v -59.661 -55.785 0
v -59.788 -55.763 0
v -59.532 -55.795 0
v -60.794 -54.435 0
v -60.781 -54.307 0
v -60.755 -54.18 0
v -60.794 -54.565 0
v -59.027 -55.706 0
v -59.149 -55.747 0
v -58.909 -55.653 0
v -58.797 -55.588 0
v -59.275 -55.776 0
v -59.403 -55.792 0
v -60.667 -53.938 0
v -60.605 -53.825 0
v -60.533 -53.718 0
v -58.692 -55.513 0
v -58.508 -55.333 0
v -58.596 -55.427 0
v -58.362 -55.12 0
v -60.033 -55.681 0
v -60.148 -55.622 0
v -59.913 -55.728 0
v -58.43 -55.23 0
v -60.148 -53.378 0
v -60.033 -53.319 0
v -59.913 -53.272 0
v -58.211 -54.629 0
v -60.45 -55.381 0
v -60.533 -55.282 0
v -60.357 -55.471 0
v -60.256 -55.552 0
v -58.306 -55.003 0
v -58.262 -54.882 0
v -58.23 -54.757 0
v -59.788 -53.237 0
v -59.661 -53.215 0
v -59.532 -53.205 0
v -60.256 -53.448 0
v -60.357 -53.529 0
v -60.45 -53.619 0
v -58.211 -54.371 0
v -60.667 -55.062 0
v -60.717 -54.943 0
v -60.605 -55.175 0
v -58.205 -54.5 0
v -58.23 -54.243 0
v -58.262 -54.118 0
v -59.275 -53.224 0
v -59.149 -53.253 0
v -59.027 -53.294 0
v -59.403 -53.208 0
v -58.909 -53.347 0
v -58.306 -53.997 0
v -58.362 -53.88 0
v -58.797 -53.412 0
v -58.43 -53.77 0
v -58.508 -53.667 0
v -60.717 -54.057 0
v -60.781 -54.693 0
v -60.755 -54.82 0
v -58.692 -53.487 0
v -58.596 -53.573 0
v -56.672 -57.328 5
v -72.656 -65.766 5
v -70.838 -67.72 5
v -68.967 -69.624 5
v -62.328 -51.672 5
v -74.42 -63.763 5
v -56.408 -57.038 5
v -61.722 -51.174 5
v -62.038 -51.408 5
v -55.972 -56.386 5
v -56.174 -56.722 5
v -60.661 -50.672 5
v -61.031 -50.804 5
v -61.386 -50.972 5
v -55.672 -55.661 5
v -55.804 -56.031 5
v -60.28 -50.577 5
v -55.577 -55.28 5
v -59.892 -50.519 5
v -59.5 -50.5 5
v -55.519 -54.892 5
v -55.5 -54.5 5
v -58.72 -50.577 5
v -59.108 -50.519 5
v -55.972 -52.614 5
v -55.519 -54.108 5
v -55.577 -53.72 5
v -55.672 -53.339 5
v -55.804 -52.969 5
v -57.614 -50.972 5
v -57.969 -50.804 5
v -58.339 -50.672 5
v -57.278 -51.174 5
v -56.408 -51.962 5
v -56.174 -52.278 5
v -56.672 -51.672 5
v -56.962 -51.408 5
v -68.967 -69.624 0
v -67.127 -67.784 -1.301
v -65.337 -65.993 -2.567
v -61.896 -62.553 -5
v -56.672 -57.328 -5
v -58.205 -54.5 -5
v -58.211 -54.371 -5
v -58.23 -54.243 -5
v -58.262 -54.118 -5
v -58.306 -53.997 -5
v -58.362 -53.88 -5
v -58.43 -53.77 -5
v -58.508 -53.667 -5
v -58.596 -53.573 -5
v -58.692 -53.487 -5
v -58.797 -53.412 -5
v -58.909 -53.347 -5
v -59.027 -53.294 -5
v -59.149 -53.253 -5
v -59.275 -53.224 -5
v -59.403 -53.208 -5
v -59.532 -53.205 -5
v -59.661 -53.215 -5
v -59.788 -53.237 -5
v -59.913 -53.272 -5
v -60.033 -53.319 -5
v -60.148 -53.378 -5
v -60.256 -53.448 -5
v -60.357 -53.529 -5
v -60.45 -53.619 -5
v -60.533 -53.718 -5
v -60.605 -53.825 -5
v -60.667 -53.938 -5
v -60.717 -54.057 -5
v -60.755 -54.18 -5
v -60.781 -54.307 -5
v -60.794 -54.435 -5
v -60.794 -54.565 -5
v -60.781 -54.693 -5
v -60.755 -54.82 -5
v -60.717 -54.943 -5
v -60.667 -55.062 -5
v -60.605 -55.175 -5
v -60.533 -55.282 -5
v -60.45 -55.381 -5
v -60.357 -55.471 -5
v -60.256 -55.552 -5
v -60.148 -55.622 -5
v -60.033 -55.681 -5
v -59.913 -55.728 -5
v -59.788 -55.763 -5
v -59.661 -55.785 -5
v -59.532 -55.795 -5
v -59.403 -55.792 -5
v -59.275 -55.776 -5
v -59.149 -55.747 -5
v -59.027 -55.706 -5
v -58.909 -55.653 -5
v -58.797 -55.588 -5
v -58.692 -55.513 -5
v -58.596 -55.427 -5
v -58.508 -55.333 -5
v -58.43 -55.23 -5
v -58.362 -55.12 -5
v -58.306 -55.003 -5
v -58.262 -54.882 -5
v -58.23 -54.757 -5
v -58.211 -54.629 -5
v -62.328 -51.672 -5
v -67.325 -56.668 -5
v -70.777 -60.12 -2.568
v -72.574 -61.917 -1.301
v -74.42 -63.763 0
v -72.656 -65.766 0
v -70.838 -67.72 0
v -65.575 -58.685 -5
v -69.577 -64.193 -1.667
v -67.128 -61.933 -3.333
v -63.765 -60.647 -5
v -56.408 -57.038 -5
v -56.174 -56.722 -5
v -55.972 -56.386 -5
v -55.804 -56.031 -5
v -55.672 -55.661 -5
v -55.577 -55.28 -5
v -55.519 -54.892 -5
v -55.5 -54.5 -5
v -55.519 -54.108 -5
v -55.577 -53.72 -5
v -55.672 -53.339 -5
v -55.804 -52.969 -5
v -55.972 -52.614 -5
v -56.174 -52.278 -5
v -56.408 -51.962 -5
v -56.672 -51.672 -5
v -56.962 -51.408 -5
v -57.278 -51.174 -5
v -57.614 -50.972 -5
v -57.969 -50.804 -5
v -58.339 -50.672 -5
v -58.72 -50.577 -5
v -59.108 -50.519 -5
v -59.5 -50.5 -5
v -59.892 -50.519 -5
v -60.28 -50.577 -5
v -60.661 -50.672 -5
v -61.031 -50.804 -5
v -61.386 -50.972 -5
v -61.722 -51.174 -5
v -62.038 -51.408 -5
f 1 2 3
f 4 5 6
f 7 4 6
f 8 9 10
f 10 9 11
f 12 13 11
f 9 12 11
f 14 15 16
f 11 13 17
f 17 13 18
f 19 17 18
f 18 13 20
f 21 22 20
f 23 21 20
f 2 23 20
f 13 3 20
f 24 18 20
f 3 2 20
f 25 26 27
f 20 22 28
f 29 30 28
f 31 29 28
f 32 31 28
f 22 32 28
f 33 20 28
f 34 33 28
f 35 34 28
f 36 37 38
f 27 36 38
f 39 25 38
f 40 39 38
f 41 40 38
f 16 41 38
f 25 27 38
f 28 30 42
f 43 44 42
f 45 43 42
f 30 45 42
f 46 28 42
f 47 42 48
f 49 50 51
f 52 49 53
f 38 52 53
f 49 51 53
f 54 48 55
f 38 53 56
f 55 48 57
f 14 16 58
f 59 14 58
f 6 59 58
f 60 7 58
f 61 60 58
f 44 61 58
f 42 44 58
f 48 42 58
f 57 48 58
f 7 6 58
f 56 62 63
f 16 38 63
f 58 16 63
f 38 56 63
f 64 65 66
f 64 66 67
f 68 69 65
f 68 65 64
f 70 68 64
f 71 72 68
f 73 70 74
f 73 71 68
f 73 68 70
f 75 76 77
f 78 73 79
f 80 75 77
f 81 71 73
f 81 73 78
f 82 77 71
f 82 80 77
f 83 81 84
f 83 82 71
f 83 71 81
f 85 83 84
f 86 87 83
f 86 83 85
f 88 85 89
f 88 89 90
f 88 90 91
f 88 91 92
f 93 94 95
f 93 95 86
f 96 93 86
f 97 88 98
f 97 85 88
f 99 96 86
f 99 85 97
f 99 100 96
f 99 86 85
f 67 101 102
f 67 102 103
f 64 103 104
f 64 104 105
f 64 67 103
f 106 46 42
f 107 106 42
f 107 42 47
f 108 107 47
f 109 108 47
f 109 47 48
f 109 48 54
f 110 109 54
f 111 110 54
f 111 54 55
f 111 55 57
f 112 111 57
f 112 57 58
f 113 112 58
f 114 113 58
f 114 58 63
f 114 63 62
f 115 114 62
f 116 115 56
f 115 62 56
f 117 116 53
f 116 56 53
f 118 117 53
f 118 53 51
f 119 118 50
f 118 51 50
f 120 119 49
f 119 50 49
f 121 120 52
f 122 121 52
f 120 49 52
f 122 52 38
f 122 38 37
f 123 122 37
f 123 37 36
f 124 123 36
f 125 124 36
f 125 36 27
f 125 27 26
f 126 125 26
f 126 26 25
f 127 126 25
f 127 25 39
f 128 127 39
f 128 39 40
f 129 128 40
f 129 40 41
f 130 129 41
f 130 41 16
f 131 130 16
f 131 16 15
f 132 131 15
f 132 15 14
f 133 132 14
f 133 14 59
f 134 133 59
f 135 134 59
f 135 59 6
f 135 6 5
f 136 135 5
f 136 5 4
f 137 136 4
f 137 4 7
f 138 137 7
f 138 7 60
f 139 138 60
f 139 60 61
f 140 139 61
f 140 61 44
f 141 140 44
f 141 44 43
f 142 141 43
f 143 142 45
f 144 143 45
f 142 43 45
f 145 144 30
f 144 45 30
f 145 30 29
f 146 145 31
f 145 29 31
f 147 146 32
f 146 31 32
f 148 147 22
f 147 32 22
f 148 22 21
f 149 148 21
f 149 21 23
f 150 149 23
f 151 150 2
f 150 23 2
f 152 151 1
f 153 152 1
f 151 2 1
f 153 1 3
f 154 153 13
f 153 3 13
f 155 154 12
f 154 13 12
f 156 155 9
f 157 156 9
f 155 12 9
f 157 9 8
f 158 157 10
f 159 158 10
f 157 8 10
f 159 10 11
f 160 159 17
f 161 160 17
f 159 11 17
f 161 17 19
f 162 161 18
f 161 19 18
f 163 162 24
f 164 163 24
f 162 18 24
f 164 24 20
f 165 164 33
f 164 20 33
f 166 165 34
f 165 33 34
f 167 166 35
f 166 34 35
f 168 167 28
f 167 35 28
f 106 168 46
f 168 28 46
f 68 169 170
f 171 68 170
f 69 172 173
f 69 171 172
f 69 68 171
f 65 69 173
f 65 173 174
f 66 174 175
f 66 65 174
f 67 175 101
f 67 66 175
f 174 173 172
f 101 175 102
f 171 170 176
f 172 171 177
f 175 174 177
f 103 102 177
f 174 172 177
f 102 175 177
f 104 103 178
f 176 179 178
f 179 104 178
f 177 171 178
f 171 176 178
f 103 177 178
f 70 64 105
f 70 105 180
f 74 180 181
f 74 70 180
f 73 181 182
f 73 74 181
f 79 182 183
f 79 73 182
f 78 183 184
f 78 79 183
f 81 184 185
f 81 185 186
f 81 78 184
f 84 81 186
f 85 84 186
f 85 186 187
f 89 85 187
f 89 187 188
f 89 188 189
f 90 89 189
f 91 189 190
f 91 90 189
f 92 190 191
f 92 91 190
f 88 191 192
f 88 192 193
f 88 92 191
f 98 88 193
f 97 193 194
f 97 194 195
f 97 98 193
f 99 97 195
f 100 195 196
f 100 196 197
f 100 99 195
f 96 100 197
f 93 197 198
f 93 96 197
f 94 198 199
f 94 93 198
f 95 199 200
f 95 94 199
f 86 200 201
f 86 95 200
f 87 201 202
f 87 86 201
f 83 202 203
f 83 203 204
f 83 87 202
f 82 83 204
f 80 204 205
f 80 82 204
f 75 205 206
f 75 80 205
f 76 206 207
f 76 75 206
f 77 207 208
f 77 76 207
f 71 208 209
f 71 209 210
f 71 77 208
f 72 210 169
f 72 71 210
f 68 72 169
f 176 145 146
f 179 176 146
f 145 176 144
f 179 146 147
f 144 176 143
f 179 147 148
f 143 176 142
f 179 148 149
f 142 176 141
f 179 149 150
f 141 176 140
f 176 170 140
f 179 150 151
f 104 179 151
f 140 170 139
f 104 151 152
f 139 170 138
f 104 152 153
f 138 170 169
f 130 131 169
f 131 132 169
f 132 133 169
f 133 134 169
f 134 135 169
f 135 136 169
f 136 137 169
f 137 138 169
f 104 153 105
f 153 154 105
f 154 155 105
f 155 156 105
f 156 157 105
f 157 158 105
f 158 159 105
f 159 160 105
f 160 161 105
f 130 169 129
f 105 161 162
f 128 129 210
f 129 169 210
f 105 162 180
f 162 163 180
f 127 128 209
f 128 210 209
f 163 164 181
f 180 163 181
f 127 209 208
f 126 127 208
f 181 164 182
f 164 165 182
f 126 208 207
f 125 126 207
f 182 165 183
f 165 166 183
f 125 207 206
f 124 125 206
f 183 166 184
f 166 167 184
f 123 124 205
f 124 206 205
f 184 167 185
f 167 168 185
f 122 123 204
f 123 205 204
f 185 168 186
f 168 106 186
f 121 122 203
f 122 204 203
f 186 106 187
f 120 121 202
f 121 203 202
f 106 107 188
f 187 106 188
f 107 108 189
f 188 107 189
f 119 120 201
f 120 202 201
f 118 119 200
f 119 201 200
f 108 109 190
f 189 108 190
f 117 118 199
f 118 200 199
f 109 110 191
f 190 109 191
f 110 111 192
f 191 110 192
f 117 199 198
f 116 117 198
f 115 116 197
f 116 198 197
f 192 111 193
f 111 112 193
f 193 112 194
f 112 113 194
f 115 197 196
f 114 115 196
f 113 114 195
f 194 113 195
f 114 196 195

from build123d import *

# Parameters (mm, degrees)
F1_DEPTH = 5
F2_DEPTH = 5
F3_SIZE2 = 10
F3_SIZE  = 5
F4_D     = 2.5908
F4_DEPTH = 5.001


with BuildPart() as f1:
    # F0 (on Top) → F1 (new body)
    with BuildSketch(Plane.XY):
        with BuildLine():
            ThreePointArc((-74.419728056, -63.7628738065), (-71.7533661722, -66.7491905791), (-68.9672591452, -69.6241133947))
            Line((-68.9672591452, -69.6241133947), (-56.6715728753, -57.3284271247))
            ThreePointArc((-56.6715728753, -57.3284271247), (-56.6715728753, -51.6715728753), (-62.3284271247, -51.6715728753))
            Line((-62.3284271247, -51.6715728753), (-74.419728056, -63.7628738065))
        make_face()
    extrude(amount=F1_DEPTH)

    # F0 (on Top) → F2 (join)
    with BuildSketch(Plane.XY):
        with BuildLine():
            ThreePointArc((-74.419728056, -63.7628738065), (-71.7533661722, -66.7491905791), (-68.9672591452, -69.6241133947))
            Line((-68.9672591452, -69.6241133947), (-56.6715728753, -57.3284271247))
            ThreePointArc((-56.6715728753, -57.3284271247), (-56.6715728753, -51.6715728753), (-62.3284271247, -51.6715728753))
            Line((-62.3284271247, -51.6715728753), (-74.419728056, -63.7628738065))
        make_face()
    extrude(amount=-F2_DEPTH)

    # F3
    f3_edges = [f1.edges().sort_by_distance(p)[0] for p in [
        (-71.753366, -66.749191, -5),
    ]]
    f3_side = f1.faces().sort_by_distance((-71.753366, -66.749191, 0))[0]
    chamfer(f3_edges, length=F3_SIZE, length2=F3_SIZE2, reference=f3_side)

    # F4 (through all, one way)
    with BuildSketch(Plane.XY):
        with Locations((-59.5, -54.5)):
            Circle(F4_D / 2)
    extrude(amount=-F4_DEPTH, mode=Mode.SUBTRACT)


solid = f1.part
